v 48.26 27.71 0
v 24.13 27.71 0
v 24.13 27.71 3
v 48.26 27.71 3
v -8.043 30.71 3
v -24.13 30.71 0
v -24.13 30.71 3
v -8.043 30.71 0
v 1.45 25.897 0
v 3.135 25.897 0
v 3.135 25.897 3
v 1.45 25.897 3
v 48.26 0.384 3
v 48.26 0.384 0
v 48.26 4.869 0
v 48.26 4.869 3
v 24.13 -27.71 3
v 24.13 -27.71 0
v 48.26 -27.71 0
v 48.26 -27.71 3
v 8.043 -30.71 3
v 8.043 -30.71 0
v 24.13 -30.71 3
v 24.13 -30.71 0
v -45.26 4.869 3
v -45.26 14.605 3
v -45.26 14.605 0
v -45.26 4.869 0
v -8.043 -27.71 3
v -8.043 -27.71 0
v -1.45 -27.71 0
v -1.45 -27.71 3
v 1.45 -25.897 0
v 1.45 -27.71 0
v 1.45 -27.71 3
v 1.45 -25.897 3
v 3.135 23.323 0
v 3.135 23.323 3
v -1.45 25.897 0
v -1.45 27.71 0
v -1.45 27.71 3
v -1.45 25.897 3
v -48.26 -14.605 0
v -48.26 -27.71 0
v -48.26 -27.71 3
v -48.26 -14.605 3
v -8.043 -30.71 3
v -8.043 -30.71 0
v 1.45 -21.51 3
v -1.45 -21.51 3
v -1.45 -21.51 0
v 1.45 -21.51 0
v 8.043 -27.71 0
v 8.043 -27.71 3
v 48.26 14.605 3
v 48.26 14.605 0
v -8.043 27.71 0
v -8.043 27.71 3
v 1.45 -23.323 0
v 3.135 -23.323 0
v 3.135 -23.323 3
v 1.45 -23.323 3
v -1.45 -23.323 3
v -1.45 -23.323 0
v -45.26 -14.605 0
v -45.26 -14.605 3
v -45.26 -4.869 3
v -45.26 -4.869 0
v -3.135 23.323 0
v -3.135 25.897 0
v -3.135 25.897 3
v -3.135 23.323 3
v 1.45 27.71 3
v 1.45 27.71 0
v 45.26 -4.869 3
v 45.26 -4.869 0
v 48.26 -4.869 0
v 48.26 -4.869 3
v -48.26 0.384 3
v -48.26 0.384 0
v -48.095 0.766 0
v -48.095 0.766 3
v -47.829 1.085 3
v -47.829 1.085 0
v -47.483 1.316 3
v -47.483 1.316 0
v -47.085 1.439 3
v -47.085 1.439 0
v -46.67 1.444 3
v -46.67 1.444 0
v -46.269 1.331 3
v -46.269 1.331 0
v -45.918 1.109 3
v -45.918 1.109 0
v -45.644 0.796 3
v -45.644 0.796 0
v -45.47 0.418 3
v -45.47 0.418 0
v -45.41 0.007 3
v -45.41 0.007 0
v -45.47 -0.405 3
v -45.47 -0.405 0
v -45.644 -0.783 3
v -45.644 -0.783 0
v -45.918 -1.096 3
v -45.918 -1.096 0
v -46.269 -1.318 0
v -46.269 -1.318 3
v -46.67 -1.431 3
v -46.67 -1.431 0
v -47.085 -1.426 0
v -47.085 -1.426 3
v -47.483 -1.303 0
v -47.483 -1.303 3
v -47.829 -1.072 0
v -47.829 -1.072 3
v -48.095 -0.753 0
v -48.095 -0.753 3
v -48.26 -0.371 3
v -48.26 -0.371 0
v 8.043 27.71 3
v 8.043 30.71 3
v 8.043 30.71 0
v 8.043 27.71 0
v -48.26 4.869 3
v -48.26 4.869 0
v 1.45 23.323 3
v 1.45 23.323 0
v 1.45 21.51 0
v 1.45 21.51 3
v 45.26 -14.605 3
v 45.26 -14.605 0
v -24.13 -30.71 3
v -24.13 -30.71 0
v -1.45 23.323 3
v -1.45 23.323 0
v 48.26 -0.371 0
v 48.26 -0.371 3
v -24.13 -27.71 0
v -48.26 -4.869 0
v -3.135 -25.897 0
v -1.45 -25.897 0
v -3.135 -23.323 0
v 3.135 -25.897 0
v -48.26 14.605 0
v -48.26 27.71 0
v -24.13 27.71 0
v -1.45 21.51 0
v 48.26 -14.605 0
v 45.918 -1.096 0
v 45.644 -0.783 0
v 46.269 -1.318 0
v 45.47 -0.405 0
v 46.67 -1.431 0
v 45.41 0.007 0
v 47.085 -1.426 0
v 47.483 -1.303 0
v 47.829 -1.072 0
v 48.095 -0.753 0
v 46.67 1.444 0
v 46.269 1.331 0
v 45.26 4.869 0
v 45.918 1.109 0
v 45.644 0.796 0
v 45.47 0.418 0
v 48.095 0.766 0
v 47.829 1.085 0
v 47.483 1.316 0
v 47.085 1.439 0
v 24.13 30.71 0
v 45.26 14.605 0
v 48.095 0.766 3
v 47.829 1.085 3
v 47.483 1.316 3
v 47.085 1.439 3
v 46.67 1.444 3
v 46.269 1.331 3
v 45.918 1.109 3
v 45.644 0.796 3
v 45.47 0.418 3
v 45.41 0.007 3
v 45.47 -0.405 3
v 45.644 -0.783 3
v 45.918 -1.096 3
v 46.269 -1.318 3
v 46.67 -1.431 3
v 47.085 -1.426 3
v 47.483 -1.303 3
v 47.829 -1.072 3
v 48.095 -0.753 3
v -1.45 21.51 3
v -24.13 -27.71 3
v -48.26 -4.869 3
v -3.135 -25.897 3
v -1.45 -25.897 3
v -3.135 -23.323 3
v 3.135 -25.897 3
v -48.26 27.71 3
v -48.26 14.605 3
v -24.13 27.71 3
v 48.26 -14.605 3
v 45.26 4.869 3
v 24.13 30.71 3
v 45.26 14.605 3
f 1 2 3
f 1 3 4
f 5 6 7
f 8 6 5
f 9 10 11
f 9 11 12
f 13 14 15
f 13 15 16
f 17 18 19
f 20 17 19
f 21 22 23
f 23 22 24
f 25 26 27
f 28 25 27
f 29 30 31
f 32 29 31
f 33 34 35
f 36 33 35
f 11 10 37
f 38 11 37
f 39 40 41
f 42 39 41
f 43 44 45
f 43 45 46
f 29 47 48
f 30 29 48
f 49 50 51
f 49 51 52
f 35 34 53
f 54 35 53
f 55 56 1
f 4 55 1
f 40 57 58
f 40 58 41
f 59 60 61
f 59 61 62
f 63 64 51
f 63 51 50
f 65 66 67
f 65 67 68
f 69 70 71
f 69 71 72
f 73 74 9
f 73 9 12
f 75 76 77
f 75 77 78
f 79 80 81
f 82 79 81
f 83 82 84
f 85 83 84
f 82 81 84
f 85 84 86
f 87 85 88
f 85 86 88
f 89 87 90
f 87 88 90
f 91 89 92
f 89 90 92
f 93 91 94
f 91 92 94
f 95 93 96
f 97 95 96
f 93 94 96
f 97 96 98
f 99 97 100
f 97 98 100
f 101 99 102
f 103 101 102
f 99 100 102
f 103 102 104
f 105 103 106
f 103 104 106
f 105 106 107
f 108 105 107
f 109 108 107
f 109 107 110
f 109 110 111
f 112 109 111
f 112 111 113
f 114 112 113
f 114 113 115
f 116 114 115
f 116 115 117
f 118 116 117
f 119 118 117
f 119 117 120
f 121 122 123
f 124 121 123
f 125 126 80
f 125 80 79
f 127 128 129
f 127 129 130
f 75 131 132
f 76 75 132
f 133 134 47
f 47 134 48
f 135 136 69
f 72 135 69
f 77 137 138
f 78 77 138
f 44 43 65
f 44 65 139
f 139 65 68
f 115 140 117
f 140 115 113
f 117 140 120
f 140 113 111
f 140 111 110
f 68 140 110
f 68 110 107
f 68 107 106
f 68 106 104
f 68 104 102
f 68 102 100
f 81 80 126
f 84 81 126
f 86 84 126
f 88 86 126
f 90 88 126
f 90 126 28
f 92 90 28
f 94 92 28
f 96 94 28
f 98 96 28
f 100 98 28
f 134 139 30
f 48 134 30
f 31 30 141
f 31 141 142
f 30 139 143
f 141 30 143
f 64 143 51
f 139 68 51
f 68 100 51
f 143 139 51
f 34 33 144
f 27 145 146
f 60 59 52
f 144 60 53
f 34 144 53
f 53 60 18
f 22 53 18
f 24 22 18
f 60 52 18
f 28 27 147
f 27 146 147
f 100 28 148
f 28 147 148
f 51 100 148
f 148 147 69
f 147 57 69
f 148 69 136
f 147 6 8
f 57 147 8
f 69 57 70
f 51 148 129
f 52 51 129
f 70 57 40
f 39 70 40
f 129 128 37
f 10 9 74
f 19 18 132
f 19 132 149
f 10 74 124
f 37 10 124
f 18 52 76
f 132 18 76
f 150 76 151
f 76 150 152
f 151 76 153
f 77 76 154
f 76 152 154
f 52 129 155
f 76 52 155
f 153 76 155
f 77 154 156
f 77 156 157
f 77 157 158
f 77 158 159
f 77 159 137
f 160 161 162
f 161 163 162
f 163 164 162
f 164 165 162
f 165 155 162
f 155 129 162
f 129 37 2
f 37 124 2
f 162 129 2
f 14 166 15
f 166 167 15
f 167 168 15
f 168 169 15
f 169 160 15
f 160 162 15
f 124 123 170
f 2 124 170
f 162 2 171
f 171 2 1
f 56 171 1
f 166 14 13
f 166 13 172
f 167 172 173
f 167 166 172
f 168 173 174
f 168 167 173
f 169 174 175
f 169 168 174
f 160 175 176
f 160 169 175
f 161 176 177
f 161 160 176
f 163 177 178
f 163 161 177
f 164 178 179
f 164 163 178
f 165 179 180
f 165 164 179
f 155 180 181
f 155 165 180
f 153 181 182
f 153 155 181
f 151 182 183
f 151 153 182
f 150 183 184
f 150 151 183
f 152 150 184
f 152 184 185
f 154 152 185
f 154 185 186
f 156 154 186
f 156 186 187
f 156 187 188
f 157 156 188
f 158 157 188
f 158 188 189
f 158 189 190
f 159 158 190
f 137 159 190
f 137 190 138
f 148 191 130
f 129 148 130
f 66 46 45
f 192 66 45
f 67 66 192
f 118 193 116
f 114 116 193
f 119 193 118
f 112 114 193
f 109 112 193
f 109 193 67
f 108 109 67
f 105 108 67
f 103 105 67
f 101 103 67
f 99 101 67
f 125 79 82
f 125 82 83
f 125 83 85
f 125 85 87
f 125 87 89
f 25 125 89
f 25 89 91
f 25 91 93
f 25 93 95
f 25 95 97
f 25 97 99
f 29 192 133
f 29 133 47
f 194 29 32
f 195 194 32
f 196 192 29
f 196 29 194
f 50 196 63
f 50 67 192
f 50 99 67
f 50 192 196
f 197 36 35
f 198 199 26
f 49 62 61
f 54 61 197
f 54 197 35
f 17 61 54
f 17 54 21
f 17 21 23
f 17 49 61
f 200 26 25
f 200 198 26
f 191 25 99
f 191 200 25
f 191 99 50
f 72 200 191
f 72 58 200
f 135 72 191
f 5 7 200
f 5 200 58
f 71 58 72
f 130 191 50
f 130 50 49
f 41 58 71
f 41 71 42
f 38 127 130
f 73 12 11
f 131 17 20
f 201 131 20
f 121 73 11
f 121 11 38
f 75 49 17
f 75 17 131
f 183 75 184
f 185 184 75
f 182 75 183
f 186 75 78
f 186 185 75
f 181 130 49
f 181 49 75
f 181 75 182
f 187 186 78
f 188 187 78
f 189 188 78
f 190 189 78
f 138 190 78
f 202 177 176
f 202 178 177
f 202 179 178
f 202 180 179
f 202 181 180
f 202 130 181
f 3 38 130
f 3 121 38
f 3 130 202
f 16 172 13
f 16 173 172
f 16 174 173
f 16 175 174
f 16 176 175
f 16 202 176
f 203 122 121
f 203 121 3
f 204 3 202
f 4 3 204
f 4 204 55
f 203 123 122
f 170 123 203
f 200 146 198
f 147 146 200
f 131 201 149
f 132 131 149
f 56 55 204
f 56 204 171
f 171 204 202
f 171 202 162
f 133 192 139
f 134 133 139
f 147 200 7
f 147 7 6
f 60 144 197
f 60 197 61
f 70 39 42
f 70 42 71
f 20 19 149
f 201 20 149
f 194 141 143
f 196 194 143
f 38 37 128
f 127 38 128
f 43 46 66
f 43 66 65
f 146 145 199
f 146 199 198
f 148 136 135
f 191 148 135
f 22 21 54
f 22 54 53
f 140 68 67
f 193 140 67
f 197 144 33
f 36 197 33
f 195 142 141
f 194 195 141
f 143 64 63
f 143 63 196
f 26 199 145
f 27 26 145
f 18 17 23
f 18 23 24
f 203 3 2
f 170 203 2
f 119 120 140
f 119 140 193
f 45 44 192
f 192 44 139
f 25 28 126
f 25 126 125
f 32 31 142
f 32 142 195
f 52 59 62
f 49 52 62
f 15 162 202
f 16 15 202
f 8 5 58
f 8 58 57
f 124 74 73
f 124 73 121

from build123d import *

# Parameters (mm, degrees)
SKETCH1_W           = 96.52
SKETCH1_H           = 55.42
BOSS_EXTRUDE1_DEPTH = 3
SKETCH2_W           = 48.26
SKETCH2_H           = 3
BOSS_EXTRUDE2_DEPTH = 3
SKETCH4_W           = 3
SKETCH4_H           = 29.21
CUT_EXTRUDE1_DEPTH  = 3
SKETCH5_W           = 16.086666666
SKETCH5_H           = 3
CUT_EXTRUDE2_DEPTH  = 3
SKETCH6_W           = 3
SKETCH6_H           = 9.737913064
BOSS_EXTRUDE3_DEPTH = 3
SKETCH7_W           = 2.9
SKETCH7_H           = 3
CUT_EXTRUDE3_DEPTH  = 6.2
SKETCH9_W           = 6.27
SKETCH9_H           = 2.573555094
CUT_EXTRUDE4_DEPTH  = 3
SKETCH10_R          = 1.45
CUT_EXTRUDE5_DEPTH  = 3


with BuildPart() as part:
    # Sketch1 → Boss-Extrude1 (new body)
    with BuildSketch(Plane.XY):
        Rectangle(SKETCH1_W, SKETCH1_H)
    extrude(amount=BOSS_EXTRUDE1_DEPTH)

    # Sketch2 → Boss-Extrude2 (add)
    with BuildSketch(Plane(origin=(0, 27.71, 0), x_dir=(1, 0, 0), z_dir=(0, 1, 0))):
        with Locations((0, -1.5)):
            Rectangle(SKETCH2_W, SKETCH2_H)
    boss_extrude2 = extrude(amount=BOSS_EXTRUDE2_DEPTH)

    # Mirror1: Boss-Extrude2 across plane
    add(boss_extrude2.mirror(Plane.ZX))

    # Sketch4 → Cut-Extrude1 (cut)
    with BuildSketch(Plane(origin=(48.26, 0, 0), x_dir=(0, 0, -1), z_dir=(1, 0, 0))):
        with Locations((-1.5, 0)):
            Rectangle(SKETCH4_W, SKETCH4_H)
    cut_extrude1 = extrude(amount=-CUT_EXTRUDE1_DEPTH, mode=Mode.SUBTRACT)

    # Mirror2: Cut-Extrude1 across plane
    add(cut_extrude1.mirror(Plane(origin=(0, 0, 0), x_dir=(0, 0, 1), z_dir=(1, 0, 0))), mode=Mode.SUBTRACT)

    # Sketch5 → Cut-Extrude2 (cut)
    with BuildSketch(Plane(origin=(0, 30.71, 0), x_dir=(1, 0, 0), z_dir=(0, 1, 0))):
        with Locations((0, -1.5)):
            Rectangle(SKETCH5_W, SKETCH5_H)
    cut_extrude2 = extrude(amount=-CUT_EXTRUDE2_DEPTH, mode=Mode.SUBTRACT)

    # Mirror3: Cut-Extrude2 across plane
    add(cut_extrude2.mirror(Plane.ZX), mode=Mode.SUBTRACT)

    # Sketch6 → Boss-Extrude3 (add)
    with BuildSketch(Plane.ZY.offset(45.26)):
        with Locations((1.5, 0)):
            Rectangle(SKETCH6_W, SKETCH6_H)
    boss_extrude3 = extrude(amount=BOSS_EXTRUDE3_DEPTH)

    # Mirror4: Boss-Extrude3 across plane
    add(boss_extrude3.mirror(Plane(origin=(0, 0, 0), x_dir=(0, 0, 1), z_dir=(1, 0, 0))))

    # Sketch7 → Cut-Extrude3 (cut)
    with BuildSketch(Plane.XZ.offset(27.71)):
        with Locations((0, 1.5)):
            Rectangle(SKETCH7_W, SKETCH7_H)
    cut_extrude3 = extrude(amount=-CUT_EXTRUDE3_DEPTH, mode=Mode.SUBTRACT)

    # Sketch9 → Cut-Extrude4 (cut)
    with BuildSketch(Plane(origin=(0, 0, 0), x_dir=(-1, 0, 0), z_dir=(0, 0, -1))):
        with Locations((0, -24.61)):
            Rectangle(SKETCH9_W, SKETCH9_H)
    cut_extrude4 = extrude(amount=-CUT_EXTRUDE4_DEPTH, mode=Mode.SUBTRACT)

    # Mirror5: Cut-Extrude3 across plane
    add(cut_extrude3.mirror(Plane.ZX), mode=Mode.SUBTRACT)

    # Mirror6: Cut-Extrude4 across plane
    add(cut_extrude4.mirror(Plane.ZX), mode=Mode.SUBTRACT)

    # Sketch10 → Cut-Extrude5 (cut)
    with BuildSketch(Plane(origin=(0, 0, 0), x_dir=(-1, 0, 0), z_dir=(0, 0, -1))):
        with Locations((46.86, 0.006629449)):
            Circle(SKETCH10_R)
    cut_extrude5 = extrude(amount=-CUT_EXTRUDE5_DEPTH, mode=Mode.SUBTRACT)

    # Mirror7: Cut-Extrude5 across plane
    add(cut_extrude5.mirror(Plane(origin=(0, 0, 0), x_dir=(0, 0, 1), z_dir=(1, 0, 0))), mode=Mode.SUBTRACT)


solid = part.part
